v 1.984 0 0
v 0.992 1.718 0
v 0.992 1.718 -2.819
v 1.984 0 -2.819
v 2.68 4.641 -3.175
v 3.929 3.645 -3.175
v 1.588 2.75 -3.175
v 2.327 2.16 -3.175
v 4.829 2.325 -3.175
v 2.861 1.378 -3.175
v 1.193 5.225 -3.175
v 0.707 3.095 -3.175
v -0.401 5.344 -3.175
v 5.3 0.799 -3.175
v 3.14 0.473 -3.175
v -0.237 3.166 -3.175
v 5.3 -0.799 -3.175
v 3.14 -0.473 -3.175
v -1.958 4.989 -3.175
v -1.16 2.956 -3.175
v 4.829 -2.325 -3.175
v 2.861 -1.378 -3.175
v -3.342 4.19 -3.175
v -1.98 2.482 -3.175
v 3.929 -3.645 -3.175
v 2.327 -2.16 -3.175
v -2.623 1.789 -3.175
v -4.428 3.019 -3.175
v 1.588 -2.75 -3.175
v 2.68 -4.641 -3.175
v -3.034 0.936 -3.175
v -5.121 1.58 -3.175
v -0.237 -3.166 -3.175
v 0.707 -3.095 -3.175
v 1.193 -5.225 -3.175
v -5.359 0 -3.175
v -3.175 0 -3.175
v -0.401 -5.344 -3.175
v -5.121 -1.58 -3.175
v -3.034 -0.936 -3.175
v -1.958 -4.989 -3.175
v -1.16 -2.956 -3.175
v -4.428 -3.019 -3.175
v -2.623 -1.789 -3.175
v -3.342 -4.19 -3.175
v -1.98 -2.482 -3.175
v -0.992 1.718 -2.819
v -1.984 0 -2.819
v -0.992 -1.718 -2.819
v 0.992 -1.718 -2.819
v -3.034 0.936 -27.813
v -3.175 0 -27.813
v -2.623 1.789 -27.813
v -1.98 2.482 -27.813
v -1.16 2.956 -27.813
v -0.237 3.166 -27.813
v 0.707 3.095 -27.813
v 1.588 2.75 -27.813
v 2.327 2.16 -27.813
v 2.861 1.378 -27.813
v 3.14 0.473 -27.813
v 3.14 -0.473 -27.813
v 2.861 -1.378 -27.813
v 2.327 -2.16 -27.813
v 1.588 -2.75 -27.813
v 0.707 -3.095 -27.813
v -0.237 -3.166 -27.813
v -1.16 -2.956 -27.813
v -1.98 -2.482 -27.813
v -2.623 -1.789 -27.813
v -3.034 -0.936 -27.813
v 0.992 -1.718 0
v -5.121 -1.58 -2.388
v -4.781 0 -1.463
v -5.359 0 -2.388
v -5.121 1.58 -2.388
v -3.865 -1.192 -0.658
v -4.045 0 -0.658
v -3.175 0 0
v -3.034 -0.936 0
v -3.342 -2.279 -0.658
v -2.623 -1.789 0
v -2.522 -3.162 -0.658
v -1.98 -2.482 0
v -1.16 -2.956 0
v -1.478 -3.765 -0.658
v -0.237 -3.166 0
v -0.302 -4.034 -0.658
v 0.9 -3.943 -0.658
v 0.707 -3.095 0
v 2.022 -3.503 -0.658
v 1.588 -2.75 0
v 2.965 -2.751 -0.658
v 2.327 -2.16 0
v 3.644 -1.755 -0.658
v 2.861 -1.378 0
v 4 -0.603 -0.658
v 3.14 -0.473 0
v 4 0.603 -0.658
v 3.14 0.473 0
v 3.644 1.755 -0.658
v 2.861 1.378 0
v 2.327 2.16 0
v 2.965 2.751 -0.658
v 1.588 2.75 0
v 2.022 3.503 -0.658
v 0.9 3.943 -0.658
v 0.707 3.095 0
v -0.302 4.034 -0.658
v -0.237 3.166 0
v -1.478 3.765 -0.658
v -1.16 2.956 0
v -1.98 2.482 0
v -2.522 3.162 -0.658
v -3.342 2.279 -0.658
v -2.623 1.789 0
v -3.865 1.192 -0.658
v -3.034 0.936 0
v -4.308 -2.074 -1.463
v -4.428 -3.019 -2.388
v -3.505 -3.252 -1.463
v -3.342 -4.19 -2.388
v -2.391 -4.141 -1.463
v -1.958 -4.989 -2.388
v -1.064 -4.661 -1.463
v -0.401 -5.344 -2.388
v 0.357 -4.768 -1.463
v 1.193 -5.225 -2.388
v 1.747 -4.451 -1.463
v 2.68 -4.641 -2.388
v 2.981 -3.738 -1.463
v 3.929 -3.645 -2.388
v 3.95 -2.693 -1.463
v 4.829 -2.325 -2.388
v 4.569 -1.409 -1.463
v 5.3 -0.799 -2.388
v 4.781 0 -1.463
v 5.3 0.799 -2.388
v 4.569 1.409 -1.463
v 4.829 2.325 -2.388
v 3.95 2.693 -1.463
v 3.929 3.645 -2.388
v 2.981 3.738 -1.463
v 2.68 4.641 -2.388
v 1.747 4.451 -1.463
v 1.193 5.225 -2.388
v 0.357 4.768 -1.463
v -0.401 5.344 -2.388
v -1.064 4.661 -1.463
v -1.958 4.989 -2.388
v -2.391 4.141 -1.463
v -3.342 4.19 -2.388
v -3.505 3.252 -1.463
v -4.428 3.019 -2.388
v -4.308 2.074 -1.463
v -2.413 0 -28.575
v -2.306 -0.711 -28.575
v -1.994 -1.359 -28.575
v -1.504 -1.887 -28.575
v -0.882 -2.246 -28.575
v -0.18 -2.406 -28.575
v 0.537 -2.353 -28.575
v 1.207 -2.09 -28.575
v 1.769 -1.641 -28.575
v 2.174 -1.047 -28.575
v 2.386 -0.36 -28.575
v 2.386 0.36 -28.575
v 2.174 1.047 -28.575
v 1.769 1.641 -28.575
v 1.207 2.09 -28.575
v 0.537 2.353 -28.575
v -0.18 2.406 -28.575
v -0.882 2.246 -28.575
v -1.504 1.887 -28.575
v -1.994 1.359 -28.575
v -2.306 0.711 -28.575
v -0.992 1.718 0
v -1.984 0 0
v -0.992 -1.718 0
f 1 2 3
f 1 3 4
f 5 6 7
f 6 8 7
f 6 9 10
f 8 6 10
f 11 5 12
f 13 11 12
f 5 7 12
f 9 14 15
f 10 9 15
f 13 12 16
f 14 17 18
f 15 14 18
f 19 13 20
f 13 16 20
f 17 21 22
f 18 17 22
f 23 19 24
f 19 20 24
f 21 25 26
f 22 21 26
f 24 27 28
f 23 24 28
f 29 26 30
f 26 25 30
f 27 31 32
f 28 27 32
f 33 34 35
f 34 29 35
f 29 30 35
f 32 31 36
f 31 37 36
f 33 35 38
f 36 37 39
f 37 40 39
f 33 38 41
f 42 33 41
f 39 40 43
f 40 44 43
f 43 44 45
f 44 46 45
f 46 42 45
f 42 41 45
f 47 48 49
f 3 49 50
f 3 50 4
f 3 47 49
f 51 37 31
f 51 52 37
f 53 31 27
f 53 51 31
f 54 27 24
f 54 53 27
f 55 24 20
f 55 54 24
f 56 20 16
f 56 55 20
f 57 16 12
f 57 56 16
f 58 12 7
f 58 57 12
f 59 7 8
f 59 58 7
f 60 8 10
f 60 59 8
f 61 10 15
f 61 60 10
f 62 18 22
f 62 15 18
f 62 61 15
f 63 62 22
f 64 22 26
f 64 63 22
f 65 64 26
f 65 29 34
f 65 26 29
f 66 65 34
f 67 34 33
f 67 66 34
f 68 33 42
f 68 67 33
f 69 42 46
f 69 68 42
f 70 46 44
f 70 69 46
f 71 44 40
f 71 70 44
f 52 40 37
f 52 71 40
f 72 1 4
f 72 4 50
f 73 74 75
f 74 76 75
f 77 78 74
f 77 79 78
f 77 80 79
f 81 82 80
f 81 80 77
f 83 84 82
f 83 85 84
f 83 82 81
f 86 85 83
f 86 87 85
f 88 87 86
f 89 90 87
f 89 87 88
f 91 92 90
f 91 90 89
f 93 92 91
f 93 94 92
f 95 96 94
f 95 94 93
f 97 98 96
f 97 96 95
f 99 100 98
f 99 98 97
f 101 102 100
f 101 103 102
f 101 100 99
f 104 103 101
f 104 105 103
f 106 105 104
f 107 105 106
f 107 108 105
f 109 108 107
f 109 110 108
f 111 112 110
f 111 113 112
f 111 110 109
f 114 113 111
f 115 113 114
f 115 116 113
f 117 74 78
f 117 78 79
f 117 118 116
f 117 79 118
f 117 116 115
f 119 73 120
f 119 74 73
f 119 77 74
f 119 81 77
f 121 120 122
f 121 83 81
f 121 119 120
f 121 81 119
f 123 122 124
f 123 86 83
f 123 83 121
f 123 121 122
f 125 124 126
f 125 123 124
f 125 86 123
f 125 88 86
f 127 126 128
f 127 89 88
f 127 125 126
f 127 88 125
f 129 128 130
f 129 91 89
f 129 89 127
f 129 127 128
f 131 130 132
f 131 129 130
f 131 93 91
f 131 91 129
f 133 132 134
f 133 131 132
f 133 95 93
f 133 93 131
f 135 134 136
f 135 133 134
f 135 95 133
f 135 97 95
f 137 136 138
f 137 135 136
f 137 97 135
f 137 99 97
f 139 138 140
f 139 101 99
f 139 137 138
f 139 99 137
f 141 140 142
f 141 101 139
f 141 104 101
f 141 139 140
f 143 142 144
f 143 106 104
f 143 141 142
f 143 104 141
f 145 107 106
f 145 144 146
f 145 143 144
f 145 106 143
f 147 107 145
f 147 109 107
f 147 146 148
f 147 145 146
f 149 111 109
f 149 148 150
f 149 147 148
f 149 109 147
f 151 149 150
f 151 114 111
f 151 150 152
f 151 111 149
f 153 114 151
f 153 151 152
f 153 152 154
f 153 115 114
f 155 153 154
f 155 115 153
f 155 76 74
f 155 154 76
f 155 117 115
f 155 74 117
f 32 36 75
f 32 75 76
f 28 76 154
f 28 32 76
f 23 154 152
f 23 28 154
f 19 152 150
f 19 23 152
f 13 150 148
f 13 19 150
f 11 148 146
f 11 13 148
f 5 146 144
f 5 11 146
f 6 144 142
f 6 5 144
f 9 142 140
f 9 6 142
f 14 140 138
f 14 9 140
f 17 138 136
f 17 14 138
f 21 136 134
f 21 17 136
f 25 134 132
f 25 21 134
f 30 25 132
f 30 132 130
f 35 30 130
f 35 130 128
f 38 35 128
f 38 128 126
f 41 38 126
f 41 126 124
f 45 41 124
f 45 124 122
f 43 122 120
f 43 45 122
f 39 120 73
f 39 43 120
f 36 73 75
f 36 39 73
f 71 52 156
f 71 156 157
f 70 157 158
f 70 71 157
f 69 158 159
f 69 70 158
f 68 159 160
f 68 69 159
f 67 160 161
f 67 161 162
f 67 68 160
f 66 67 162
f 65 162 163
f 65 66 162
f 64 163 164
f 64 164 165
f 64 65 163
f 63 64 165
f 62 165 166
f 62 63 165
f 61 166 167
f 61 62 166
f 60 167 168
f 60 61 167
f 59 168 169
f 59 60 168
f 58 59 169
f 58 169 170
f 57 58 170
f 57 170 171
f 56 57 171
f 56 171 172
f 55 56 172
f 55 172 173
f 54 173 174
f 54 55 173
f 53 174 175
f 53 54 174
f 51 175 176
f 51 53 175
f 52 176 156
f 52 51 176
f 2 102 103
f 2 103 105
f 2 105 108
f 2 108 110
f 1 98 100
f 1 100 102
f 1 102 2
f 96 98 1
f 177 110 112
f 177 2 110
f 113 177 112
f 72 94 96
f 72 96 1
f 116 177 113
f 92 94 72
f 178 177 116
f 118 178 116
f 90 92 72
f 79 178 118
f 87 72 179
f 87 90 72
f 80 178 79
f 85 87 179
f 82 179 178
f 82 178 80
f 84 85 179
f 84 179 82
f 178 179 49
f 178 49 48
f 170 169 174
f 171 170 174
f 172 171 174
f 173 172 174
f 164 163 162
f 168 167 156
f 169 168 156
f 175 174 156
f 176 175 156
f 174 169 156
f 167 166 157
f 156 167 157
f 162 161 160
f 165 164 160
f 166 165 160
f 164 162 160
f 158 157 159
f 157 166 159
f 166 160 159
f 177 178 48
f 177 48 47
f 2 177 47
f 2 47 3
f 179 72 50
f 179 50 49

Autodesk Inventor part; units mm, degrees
ref_plane "YZ Plane" through (0, 0, 0) normal (1, 0, 0) x (0, 1, 0)
ref_plane "XZ Plane" through (0, 0, 0) normal (0, 1, 0) x (-1, 0, 0)
ref_plane "XY Plane" through (0, 0, 0) normal (0, 0, 1) x (1, 0, 0)
sketch "Sketch1" plane through (0, 0, 0) normal (0, 1, 0) x (-1, 0, 0)
  line L0 (0, 0) -> (3.175, 0)
  line L1 (5.3594, -2.3876) -> (5.3594, -3.175)
  line L2 (5.3594, -3.175) -> (3.175, -3.175)
  line L3 (3.175, -3.175) -> (3.175, -28.575)
  line L4 (3.175, -28.575) -> (0, -28.575)
  line L5 (0, -28.575) -> (0, 0)
  arc A0 (5.3594, -2.3876) -> (3.175, 0) centre (0.0087, -5.0899) ccw
  dimension "d0" = 3.175
  dimension "d1" = 5.3594
  dimension "d2" = 0.7874
  dimension "d3" = 3.175
  dimension "d8" = 3.175
  dimension "d9" = 5.9944
  dimension "d20" = 25.4
revolve "Revolution1" add sketch "Sketch1" angle 360 about axis through (0, 0, -28.575) along (0, 0, 1)
chamfer "Chamfer1" distance 0.762 angle 45 1 edges at (3.175, 0, -28.575)
sketch "Sketch2" plane through (0, 0, 0) normal (0, 0, 1) x (1, 0, 0)
  line L0 (1.9844, 0) -> (0.9922, -1.7185)
  line L1 (0.9922, -1.7185) -> (-0.9922, -1.7185)
  line L2 (-0.9922, -1.7185) -> (-1.9844, 0)
  line L3 (-1.9844, 0) -> (-0.9922, 1.7185)
  line L4 (-0.9922, 1.7185) -> (0.9922, 1.7185)
  line L5 (0.9922, 1.7185) -> (1.9844, 0)
  point P0 (0, 0)
  point P1 (0, 0)
  dimension "d14" = 3.9688
extrude "Extrusion1" cut sketch "Sketch2" against normal blind 2.8194
thread "Thread1" size "1/4-20 UNC" class "2A" standard "ANSI Unified Screw Threads" length 19.05
properties part number "Axle Peg"
